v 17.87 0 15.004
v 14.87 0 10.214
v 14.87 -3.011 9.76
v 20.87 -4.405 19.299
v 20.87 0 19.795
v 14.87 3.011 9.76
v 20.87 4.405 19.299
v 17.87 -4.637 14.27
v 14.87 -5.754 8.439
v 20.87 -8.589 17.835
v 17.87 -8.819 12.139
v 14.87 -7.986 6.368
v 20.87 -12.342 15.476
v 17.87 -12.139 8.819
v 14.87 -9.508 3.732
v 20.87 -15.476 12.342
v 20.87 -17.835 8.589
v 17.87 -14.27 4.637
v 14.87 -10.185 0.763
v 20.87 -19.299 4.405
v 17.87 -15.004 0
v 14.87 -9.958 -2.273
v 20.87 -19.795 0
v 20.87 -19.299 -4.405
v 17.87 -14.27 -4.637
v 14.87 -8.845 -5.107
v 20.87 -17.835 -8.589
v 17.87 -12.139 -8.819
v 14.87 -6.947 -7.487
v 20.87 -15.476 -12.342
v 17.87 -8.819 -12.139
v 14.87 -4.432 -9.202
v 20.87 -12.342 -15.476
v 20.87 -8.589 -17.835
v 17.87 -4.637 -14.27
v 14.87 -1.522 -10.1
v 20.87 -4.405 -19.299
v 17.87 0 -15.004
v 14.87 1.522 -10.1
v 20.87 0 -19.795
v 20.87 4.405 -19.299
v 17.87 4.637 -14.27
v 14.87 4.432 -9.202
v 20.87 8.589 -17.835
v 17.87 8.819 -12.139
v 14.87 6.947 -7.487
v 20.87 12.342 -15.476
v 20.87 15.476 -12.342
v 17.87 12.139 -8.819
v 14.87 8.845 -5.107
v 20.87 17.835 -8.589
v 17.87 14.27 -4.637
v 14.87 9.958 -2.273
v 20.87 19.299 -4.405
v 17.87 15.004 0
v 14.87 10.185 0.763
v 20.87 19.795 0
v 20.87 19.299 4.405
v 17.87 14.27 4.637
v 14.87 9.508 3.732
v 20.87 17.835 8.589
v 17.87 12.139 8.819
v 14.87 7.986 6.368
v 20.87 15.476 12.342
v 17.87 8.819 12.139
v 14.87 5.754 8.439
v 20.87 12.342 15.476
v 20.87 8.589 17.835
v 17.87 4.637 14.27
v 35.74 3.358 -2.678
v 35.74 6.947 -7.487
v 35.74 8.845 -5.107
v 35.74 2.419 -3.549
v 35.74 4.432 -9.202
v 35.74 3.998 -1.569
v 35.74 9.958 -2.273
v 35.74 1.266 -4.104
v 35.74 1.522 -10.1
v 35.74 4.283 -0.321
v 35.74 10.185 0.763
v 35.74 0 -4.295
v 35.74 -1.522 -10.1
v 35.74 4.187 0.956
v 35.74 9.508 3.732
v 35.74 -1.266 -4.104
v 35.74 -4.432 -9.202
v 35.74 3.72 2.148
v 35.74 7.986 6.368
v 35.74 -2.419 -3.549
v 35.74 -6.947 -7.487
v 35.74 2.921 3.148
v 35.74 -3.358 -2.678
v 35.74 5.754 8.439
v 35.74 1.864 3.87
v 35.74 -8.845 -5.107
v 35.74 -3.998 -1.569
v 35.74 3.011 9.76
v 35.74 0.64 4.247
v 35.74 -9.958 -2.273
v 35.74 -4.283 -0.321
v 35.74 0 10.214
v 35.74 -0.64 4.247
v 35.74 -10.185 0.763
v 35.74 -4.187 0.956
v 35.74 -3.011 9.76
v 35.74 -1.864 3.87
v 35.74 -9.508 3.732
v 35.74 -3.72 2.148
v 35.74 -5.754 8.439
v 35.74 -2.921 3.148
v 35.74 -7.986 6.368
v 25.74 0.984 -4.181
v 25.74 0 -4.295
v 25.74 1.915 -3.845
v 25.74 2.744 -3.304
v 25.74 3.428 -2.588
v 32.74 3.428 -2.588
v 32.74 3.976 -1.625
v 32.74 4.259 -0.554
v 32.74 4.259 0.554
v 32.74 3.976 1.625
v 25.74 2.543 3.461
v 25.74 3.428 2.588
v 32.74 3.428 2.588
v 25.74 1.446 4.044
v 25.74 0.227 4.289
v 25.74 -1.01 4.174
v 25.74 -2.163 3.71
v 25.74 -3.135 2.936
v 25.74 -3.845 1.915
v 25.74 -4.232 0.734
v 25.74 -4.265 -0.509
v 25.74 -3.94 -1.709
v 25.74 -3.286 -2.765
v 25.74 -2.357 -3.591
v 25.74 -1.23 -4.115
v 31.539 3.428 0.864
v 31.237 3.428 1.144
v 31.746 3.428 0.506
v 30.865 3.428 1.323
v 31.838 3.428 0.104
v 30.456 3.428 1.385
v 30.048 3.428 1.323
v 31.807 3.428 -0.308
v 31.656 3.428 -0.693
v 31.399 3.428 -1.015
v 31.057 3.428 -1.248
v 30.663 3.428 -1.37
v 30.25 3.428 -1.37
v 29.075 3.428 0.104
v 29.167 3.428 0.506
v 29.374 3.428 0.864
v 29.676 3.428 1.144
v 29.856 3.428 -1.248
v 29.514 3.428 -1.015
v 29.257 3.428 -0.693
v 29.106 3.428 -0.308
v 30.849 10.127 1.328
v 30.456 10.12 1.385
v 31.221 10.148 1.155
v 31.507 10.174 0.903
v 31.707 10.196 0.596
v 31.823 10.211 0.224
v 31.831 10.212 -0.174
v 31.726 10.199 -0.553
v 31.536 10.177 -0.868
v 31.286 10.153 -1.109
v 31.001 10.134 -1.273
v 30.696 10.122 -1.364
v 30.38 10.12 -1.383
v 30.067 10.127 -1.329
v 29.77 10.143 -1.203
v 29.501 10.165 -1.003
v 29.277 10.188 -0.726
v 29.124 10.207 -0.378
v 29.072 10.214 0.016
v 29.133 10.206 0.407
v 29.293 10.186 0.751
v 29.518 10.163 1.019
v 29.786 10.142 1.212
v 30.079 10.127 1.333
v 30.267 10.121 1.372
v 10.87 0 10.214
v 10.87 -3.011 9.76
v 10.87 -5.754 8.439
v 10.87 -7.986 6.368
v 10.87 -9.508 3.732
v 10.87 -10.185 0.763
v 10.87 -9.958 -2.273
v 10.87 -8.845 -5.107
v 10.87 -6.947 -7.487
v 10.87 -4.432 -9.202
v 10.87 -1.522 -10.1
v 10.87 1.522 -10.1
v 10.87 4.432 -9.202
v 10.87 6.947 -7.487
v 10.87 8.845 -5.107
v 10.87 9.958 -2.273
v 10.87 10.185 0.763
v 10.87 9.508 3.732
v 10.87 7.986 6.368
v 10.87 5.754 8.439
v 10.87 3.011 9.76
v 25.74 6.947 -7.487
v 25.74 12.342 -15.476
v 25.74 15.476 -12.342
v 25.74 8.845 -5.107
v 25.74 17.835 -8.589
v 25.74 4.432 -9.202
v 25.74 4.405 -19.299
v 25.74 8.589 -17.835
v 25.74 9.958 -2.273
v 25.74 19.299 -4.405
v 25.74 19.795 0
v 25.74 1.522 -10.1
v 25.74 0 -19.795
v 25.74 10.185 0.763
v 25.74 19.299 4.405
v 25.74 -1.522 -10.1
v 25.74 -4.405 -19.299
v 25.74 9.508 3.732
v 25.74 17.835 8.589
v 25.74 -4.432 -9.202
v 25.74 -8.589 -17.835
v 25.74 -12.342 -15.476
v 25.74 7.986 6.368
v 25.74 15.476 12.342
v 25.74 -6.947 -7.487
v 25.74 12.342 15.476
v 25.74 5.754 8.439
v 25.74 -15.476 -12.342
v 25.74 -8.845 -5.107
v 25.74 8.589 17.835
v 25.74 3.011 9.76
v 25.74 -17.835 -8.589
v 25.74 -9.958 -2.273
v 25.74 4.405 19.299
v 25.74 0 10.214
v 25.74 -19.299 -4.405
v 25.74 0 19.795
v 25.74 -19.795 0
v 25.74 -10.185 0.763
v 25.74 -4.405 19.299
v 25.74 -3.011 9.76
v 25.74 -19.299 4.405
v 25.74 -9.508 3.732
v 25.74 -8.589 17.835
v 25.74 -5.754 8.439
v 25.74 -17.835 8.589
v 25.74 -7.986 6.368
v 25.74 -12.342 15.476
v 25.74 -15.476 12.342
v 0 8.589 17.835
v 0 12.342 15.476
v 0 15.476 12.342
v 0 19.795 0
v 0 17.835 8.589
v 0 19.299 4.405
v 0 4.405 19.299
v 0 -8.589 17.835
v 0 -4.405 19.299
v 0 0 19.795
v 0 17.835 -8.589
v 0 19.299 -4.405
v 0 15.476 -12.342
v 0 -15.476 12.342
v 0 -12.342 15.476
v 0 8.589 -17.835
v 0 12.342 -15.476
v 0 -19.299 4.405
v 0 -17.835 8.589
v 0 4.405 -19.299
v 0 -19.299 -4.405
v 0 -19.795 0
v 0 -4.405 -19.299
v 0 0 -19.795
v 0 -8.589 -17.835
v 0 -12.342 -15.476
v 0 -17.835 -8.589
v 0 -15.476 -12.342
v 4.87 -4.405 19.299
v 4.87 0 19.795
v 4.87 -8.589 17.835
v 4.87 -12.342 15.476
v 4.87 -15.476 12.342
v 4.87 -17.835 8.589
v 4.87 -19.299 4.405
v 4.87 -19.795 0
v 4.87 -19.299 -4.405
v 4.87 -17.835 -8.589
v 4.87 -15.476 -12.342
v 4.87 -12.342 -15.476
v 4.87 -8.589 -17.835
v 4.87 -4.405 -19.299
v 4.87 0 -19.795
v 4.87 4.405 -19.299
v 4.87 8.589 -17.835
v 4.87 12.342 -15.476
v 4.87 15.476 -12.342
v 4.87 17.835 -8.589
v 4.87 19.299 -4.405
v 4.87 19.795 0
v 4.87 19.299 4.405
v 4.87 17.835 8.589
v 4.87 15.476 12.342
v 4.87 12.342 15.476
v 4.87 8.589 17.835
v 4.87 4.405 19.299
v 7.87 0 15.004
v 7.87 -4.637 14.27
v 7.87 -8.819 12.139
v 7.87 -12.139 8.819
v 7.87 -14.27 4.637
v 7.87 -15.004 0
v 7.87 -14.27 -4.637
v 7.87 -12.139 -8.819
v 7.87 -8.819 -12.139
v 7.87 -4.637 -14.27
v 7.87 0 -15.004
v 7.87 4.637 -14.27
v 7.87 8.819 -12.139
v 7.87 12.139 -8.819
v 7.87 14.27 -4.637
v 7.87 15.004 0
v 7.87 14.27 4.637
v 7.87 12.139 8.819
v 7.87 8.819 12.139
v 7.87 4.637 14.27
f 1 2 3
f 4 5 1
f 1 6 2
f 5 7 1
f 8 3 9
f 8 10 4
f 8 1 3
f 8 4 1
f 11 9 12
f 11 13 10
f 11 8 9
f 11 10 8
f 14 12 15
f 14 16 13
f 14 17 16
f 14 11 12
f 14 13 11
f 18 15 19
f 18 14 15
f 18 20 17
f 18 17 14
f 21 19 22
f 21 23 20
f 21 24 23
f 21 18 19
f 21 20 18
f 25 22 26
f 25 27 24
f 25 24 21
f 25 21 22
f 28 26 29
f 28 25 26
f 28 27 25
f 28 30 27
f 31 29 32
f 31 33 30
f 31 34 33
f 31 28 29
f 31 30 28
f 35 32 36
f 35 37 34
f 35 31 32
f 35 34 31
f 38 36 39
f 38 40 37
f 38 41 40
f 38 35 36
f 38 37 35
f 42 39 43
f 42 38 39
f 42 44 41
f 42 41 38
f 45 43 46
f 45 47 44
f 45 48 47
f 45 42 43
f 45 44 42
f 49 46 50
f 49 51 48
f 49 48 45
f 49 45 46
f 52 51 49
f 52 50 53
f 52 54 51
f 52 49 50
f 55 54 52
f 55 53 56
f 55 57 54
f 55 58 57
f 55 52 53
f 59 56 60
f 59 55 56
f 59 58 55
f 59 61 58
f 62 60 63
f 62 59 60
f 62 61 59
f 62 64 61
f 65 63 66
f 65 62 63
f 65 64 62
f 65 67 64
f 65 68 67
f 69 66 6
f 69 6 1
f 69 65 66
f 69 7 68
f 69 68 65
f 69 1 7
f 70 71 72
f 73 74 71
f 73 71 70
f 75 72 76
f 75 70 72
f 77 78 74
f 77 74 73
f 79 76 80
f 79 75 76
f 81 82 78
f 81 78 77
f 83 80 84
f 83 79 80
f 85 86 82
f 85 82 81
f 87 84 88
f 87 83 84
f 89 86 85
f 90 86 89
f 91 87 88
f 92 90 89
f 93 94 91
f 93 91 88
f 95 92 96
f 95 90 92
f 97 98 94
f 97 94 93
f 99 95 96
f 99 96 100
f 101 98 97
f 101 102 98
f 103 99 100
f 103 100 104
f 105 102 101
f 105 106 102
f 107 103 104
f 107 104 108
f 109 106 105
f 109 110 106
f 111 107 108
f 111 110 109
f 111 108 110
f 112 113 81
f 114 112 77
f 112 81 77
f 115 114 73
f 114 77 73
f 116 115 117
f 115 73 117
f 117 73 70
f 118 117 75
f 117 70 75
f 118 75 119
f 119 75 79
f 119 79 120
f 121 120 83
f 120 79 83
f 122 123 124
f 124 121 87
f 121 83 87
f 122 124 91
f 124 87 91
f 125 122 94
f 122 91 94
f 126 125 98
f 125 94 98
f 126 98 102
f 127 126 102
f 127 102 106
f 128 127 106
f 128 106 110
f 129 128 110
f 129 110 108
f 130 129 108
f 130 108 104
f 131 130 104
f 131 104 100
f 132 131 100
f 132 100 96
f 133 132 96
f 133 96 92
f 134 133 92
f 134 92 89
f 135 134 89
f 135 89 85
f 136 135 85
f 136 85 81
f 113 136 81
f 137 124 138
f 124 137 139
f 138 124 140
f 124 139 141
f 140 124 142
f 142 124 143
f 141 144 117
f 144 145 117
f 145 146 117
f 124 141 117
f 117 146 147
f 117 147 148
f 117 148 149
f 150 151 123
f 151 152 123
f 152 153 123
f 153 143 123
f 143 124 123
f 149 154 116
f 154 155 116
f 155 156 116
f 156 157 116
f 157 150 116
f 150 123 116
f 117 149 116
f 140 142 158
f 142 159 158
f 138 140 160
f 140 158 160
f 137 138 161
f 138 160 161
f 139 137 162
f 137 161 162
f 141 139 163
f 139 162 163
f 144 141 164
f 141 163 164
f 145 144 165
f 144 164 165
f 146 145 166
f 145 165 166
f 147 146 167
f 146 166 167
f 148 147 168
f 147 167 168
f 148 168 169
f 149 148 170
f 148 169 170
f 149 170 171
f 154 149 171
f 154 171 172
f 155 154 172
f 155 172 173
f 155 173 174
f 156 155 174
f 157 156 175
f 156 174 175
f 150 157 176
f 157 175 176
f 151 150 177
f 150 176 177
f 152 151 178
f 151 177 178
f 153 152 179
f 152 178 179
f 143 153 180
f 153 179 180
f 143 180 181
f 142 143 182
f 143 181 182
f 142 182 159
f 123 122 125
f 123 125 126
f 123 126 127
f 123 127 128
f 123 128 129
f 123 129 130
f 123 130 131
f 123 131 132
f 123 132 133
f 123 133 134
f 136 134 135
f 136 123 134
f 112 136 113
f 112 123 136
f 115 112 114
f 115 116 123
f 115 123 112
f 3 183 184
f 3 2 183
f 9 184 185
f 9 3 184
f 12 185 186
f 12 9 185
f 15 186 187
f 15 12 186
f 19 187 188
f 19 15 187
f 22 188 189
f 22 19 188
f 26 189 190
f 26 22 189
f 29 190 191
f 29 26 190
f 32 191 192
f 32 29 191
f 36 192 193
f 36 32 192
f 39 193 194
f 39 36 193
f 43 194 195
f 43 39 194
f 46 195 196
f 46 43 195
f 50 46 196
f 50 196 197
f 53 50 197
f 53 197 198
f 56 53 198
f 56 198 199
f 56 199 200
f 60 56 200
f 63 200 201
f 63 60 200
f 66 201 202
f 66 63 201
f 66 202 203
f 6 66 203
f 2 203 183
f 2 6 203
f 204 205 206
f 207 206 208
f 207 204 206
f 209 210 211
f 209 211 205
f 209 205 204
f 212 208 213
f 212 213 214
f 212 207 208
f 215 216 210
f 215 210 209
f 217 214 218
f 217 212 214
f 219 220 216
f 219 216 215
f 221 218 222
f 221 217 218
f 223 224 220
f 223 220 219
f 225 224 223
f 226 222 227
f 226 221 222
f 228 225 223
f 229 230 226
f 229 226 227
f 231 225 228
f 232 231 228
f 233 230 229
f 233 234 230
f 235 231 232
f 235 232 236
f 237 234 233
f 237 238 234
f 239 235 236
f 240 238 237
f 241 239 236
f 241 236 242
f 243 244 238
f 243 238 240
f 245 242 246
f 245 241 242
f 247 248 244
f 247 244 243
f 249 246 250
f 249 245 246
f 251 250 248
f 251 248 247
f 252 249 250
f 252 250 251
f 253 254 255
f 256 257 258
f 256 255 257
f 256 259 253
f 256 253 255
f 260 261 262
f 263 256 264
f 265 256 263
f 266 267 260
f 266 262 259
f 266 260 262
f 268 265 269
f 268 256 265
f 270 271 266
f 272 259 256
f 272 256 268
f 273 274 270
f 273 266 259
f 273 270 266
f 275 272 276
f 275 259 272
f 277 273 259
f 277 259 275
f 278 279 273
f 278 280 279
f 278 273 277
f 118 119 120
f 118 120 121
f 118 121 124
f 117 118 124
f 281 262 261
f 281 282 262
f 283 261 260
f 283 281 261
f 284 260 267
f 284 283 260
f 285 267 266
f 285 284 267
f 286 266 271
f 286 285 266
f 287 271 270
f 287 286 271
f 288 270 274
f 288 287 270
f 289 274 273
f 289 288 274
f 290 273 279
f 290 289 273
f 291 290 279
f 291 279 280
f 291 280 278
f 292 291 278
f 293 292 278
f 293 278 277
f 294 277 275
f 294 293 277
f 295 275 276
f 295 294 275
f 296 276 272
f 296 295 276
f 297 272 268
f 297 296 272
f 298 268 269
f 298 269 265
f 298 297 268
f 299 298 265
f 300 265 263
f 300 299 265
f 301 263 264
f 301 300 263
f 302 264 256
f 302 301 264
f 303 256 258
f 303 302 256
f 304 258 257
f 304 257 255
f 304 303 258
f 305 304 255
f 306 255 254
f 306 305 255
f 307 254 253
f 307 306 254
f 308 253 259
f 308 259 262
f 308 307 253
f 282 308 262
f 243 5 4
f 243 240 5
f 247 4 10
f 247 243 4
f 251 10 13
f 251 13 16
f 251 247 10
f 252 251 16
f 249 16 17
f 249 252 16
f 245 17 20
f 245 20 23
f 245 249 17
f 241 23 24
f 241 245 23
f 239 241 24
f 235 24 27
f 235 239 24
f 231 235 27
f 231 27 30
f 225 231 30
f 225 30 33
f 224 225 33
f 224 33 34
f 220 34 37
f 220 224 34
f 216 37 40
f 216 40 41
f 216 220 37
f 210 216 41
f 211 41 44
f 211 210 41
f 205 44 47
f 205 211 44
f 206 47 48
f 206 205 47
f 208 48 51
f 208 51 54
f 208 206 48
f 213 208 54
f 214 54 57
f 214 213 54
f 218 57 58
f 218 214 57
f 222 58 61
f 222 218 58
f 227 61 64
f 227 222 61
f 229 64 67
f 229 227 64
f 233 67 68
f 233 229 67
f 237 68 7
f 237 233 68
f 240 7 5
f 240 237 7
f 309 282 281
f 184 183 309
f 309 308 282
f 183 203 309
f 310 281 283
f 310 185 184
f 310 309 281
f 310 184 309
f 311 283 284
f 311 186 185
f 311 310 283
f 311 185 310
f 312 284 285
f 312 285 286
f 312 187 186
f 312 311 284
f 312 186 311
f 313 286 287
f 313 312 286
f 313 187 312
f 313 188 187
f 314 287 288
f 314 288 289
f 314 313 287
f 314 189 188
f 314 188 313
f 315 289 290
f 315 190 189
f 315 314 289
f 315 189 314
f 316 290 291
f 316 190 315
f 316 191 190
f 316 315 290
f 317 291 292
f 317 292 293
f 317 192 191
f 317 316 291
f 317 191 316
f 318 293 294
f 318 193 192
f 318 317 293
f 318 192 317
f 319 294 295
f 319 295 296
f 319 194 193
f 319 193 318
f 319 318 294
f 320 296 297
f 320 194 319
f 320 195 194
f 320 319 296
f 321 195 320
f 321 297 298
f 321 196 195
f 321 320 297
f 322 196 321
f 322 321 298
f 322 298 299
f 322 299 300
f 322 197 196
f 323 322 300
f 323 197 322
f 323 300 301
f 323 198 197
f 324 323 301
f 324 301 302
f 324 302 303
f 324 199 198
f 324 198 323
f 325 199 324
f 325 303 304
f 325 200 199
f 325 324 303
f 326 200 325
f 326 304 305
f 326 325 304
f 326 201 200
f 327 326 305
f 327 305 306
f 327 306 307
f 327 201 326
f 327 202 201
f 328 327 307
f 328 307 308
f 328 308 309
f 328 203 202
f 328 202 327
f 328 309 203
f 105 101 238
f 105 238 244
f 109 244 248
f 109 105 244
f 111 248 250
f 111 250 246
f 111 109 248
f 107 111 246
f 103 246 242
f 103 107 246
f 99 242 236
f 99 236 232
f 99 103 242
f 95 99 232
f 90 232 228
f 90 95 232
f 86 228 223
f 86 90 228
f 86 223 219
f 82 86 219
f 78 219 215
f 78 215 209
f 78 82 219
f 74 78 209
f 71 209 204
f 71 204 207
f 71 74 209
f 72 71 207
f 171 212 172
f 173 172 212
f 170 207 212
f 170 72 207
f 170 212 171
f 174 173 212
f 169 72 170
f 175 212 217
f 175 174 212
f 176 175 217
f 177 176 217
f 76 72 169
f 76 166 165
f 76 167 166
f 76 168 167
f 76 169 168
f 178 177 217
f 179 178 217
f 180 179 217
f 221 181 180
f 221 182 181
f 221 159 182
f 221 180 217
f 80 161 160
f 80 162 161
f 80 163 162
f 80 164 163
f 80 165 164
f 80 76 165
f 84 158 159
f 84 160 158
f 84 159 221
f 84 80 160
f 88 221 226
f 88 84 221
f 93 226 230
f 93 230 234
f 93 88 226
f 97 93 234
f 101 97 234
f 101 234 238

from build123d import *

# Parameters (mm, degrees)
SKETCH_2_R          = 1.385
CUT_EXTRUDE_1_DEPTH = 10
SKETCH_3_R          = 4.295
CUT_EXTRUDE_2_DEPTH = 10
SKETCH_4_W          = 5.34454344
SKETCH_4_H          = 1.293128569
EXTRUDE_1_DEPTH     = 7
SKETCH_6_R          = 1.385
CUT_EXTRUDE_3_DEPTH = 7


with BuildPart() as part:
    # 草圖1 → 旋轉1 (revolve)
    with BuildSketch(Plane.XY, mode=Mode.PRIVATE) as revolve_1_sk:
        Polygon((0, 0), (0, 19.795), (4.87, 19.795), (10.87, 10.213858447), (14.87, 10.213858447), (20.87, 19.795), (25.74, 19.795), (25.74, 10.213858447), (35.74, 10.213858447), (35.74, 0), align=None)
    revolve(revolve_1_sk.sketch.rotate(Axis((-743.15639781, 0, 0), (1, 0, 0)), 90), axis=Axis((-743.15639781, 0, 0), (1, 0, 0)))

    # 草圖2 → 除料-伸長1 (cut)
    with BuildSketch(Plane(origin=(0, 12, 0), x_dir=(1, 0, 0), z_dir=(0, 1, 0))):
        with Locations(Location((30.456485429, 0, 0), (0, 0, 270))):
            Circle(SKETCH_2_R)
    extrude(amount=-CUT_EXTRUDE_1_DEPTH, mode=Mode.SUBTRACT)

    # 草圖3 → 除料-伸長2 (cut)
    with BuildSketch(Plane(origin=(35.74, 0, 0), x_dir=(0, 0, -1), z_dir=(1, 0, 0))):
        Circle(SKETCH_3_R)
    extrude(amount=-CUT_EXTRUDE_2_DEPTH, mode=Mode.SUBTRACT)

    # 草圖4 → 填料-伸長1 (add)
    with BuildSketch(Plane(origin=(25.74, 0, 0), x_dir=(0, 0, -1), z_dir=(1, 0, 0))):
        with Locations((-0.084600543, 4.07453495)):
            Rectangle(SKETCH_4_W, SKETCH_4_H)
    extrude(amount=EXTRUDE_1_DEPTH)

    # 草圖6 → 除料-伸長3 (cut)
    with BuildSketch(Plane(origin=(0, 4.721099234, 0), x_dir=(1, 0, 0), z_dir=(0, 1, 0))):
        with Locations(Location((30.456485429, 0, 0), (0, 0, 270))):
            Circle(SKETCH_6_R)
    extrude(amount=-CUT_EXTRUDE_3_DEPTH, mode=Mode.SUBTRACT)


solid = part.part
